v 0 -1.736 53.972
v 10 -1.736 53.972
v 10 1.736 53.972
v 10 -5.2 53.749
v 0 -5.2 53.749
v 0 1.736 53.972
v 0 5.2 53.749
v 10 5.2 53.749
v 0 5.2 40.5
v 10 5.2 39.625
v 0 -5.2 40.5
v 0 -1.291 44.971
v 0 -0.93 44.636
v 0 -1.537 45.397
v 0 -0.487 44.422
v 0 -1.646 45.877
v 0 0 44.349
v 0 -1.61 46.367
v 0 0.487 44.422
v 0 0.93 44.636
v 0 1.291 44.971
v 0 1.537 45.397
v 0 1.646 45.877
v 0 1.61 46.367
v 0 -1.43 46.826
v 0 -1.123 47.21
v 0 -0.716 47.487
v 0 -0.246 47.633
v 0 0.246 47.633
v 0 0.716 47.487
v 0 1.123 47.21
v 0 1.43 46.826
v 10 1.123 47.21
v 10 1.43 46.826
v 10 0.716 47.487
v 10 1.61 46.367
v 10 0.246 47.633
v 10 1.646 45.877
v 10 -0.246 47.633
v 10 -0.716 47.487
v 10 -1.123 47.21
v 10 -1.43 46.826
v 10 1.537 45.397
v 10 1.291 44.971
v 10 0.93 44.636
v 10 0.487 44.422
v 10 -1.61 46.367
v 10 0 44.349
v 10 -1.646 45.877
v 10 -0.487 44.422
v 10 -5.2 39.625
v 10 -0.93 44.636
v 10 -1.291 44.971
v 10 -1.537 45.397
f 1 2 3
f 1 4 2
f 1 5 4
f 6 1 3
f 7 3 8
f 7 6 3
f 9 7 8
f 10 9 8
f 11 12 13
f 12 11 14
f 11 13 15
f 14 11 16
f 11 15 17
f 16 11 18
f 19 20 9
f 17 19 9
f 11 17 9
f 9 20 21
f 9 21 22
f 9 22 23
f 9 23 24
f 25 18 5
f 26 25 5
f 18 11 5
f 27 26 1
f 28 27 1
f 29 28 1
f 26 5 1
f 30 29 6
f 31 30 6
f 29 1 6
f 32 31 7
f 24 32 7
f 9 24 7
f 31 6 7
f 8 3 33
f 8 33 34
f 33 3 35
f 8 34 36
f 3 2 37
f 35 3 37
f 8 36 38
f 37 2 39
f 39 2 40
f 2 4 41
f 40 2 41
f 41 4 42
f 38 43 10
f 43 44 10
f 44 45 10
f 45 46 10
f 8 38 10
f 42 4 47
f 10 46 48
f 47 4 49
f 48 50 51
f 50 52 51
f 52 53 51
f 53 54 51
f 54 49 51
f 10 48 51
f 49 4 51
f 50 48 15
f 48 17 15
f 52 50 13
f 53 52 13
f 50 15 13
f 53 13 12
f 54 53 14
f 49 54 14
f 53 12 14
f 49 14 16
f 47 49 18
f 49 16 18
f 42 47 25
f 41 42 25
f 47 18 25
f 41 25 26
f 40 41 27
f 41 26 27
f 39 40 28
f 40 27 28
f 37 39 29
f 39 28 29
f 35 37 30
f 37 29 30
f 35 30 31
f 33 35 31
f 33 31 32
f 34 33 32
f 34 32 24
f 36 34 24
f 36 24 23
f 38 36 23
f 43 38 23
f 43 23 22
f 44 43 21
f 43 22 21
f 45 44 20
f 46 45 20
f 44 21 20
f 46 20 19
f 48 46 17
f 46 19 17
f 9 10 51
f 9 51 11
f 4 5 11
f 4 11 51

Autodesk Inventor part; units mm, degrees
ref_plane "YZ Plane" through (0, 0, 0) normal (1, 0, 0) x (0, 1, 0)
ref_plane "XZ Plane" through (0, 0, 0) normal (0, 1, 0) x (-1, 0, 0)
ref_plane "XY Plane" through (0, 0, 0) normal (0, 0, 1) x (1, 0, 0)
sketch "Sketch1" plane through (0, 0, 0) normal (1, 0, 0) x (0, 1, 0)
  circle A0 centre (0, 0) radius 54
  circle A1 centre (0, 46) radius 1
  circle A2 centre (0, 46) radius 5.5
  line L0 (5.2, 40.5) -> (-5.2, 40.5)
  arc A3 (5.2, 53.749) -> (-5.2, 53.749) centre (0, 0) ccw
  line L1 (5.2, 53.749) -> (5.2, 40.5)
  line L2 (-5.2, 53.749) -> (-5.2, 40.5)
  circle A4 centre (0, 46) radius 5.2
  dimension "d0" = 108
  dimension "d1" = 46
  dimension "d2" = 2
  dimension "d3" = 11
  dimension "d23" = 10.4
  dimension "d24" = 0
extrude "Extrusion1" add sketch "Sketch1" along normal blind 10 contours L1 A2 L2 A0 | L1 A4 L2 A2 | A4 | L1 A2 L2 A4 | A2 L0 L2 | L1 L0 A2 | A1
sketch "Sketch2" plane through (10, 0, 0) normal (1, 0, 0) x (0, 0, -1)
  circle A0 centre (0, 0) radius 54
  point P0 (-46, 0)
  dimension "d15" = 46
hole "Hole2" at (10, 0, 46) direction (-1, 0, 0) diameter 3.302 end through all thread size "8-32 UNC" class "2B" standard "ANSI Unified Screw Threads"
sketch "Sketch3" plane through (0, -5.2, 40.5) normal (0, -1, 0) x (1, 0, 0)
  line L0 (0, 0) -> (10, 0)
  line L1 (0, 0) -> (10, 0) projected
  line L2 (10.0706, -0.8811) -> (0, 0)
  line L3 (10, 13.249) -> (10, 0) projected
  line L4 (10, 0) -> (10, -0.8749)
  point P0 (0, -40.5)
  dimension "d25" = 5
extrude "Extrusion2" add sketch "Sketch3" against normal up to surface (10.4 mm away)
properties part number "32110_Lock Wedge_V1" material "Acetal Resin, White"
